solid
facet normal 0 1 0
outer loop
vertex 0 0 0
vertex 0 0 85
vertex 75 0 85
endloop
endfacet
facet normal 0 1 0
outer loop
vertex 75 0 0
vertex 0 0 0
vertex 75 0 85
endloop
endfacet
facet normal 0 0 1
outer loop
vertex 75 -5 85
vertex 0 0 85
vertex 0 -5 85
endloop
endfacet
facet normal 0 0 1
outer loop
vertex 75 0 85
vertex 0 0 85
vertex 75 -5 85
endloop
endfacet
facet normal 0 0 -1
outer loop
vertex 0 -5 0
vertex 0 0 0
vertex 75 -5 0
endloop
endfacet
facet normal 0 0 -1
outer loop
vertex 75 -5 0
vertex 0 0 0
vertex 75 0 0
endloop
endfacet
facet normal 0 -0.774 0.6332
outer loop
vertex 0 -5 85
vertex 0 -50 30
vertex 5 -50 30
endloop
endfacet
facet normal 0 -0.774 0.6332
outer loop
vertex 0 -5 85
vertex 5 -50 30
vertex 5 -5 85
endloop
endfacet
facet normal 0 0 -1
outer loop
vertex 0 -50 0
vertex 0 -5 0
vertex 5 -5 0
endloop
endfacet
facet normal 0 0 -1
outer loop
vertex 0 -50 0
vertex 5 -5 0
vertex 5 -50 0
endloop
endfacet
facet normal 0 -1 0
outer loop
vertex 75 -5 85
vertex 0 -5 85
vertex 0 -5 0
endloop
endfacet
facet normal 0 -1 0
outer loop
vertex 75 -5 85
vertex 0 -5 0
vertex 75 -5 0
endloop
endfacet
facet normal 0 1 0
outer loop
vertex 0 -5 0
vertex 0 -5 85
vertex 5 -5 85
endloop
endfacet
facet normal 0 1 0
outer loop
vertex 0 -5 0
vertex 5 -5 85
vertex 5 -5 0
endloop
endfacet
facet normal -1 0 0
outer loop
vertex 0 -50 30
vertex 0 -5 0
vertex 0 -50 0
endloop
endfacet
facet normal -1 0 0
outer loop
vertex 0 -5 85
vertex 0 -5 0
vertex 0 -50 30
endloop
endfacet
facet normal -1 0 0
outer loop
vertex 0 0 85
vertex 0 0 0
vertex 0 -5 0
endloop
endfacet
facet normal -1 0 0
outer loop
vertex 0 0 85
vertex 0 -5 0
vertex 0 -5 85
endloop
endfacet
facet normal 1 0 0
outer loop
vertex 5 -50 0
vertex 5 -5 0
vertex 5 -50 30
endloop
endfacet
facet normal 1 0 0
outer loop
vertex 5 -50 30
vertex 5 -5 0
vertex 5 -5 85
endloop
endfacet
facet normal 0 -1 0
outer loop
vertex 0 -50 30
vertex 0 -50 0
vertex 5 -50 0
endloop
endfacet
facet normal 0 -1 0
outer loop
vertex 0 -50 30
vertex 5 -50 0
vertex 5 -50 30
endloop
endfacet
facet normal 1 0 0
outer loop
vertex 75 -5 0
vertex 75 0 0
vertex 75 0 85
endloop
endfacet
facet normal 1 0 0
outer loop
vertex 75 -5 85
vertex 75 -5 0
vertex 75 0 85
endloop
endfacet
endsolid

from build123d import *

# Parameters (mm, degrees)
F0_W     = 75
F0_H     = 85
F1_DEPTH = 5
F3_DEPTH = 5


with BuildPart() as f1:
    # F0 (on Front) → F1 (new body)
    with BuildSketch(Plane.XZ):
        with Locations((37.5, 42.5)):
            Rectangle(F0_W, F0_H)
    extrude(amount=F1_DEPTH)


with BuildPart() as f3:
    # F2 (on face) → F3 (new body)
    with BuildSketch(Plane(origin=(0, 0, 0), x_dir=(0, -1, 0), z_dir=(-1, 0, 0))):
        Polygon((5, 85), (5, 0), (50, 0), (50, 30), align=None)
    extrude(amount=-F3_DEPTH)


solid = Compound([f1.part, f3.part])
